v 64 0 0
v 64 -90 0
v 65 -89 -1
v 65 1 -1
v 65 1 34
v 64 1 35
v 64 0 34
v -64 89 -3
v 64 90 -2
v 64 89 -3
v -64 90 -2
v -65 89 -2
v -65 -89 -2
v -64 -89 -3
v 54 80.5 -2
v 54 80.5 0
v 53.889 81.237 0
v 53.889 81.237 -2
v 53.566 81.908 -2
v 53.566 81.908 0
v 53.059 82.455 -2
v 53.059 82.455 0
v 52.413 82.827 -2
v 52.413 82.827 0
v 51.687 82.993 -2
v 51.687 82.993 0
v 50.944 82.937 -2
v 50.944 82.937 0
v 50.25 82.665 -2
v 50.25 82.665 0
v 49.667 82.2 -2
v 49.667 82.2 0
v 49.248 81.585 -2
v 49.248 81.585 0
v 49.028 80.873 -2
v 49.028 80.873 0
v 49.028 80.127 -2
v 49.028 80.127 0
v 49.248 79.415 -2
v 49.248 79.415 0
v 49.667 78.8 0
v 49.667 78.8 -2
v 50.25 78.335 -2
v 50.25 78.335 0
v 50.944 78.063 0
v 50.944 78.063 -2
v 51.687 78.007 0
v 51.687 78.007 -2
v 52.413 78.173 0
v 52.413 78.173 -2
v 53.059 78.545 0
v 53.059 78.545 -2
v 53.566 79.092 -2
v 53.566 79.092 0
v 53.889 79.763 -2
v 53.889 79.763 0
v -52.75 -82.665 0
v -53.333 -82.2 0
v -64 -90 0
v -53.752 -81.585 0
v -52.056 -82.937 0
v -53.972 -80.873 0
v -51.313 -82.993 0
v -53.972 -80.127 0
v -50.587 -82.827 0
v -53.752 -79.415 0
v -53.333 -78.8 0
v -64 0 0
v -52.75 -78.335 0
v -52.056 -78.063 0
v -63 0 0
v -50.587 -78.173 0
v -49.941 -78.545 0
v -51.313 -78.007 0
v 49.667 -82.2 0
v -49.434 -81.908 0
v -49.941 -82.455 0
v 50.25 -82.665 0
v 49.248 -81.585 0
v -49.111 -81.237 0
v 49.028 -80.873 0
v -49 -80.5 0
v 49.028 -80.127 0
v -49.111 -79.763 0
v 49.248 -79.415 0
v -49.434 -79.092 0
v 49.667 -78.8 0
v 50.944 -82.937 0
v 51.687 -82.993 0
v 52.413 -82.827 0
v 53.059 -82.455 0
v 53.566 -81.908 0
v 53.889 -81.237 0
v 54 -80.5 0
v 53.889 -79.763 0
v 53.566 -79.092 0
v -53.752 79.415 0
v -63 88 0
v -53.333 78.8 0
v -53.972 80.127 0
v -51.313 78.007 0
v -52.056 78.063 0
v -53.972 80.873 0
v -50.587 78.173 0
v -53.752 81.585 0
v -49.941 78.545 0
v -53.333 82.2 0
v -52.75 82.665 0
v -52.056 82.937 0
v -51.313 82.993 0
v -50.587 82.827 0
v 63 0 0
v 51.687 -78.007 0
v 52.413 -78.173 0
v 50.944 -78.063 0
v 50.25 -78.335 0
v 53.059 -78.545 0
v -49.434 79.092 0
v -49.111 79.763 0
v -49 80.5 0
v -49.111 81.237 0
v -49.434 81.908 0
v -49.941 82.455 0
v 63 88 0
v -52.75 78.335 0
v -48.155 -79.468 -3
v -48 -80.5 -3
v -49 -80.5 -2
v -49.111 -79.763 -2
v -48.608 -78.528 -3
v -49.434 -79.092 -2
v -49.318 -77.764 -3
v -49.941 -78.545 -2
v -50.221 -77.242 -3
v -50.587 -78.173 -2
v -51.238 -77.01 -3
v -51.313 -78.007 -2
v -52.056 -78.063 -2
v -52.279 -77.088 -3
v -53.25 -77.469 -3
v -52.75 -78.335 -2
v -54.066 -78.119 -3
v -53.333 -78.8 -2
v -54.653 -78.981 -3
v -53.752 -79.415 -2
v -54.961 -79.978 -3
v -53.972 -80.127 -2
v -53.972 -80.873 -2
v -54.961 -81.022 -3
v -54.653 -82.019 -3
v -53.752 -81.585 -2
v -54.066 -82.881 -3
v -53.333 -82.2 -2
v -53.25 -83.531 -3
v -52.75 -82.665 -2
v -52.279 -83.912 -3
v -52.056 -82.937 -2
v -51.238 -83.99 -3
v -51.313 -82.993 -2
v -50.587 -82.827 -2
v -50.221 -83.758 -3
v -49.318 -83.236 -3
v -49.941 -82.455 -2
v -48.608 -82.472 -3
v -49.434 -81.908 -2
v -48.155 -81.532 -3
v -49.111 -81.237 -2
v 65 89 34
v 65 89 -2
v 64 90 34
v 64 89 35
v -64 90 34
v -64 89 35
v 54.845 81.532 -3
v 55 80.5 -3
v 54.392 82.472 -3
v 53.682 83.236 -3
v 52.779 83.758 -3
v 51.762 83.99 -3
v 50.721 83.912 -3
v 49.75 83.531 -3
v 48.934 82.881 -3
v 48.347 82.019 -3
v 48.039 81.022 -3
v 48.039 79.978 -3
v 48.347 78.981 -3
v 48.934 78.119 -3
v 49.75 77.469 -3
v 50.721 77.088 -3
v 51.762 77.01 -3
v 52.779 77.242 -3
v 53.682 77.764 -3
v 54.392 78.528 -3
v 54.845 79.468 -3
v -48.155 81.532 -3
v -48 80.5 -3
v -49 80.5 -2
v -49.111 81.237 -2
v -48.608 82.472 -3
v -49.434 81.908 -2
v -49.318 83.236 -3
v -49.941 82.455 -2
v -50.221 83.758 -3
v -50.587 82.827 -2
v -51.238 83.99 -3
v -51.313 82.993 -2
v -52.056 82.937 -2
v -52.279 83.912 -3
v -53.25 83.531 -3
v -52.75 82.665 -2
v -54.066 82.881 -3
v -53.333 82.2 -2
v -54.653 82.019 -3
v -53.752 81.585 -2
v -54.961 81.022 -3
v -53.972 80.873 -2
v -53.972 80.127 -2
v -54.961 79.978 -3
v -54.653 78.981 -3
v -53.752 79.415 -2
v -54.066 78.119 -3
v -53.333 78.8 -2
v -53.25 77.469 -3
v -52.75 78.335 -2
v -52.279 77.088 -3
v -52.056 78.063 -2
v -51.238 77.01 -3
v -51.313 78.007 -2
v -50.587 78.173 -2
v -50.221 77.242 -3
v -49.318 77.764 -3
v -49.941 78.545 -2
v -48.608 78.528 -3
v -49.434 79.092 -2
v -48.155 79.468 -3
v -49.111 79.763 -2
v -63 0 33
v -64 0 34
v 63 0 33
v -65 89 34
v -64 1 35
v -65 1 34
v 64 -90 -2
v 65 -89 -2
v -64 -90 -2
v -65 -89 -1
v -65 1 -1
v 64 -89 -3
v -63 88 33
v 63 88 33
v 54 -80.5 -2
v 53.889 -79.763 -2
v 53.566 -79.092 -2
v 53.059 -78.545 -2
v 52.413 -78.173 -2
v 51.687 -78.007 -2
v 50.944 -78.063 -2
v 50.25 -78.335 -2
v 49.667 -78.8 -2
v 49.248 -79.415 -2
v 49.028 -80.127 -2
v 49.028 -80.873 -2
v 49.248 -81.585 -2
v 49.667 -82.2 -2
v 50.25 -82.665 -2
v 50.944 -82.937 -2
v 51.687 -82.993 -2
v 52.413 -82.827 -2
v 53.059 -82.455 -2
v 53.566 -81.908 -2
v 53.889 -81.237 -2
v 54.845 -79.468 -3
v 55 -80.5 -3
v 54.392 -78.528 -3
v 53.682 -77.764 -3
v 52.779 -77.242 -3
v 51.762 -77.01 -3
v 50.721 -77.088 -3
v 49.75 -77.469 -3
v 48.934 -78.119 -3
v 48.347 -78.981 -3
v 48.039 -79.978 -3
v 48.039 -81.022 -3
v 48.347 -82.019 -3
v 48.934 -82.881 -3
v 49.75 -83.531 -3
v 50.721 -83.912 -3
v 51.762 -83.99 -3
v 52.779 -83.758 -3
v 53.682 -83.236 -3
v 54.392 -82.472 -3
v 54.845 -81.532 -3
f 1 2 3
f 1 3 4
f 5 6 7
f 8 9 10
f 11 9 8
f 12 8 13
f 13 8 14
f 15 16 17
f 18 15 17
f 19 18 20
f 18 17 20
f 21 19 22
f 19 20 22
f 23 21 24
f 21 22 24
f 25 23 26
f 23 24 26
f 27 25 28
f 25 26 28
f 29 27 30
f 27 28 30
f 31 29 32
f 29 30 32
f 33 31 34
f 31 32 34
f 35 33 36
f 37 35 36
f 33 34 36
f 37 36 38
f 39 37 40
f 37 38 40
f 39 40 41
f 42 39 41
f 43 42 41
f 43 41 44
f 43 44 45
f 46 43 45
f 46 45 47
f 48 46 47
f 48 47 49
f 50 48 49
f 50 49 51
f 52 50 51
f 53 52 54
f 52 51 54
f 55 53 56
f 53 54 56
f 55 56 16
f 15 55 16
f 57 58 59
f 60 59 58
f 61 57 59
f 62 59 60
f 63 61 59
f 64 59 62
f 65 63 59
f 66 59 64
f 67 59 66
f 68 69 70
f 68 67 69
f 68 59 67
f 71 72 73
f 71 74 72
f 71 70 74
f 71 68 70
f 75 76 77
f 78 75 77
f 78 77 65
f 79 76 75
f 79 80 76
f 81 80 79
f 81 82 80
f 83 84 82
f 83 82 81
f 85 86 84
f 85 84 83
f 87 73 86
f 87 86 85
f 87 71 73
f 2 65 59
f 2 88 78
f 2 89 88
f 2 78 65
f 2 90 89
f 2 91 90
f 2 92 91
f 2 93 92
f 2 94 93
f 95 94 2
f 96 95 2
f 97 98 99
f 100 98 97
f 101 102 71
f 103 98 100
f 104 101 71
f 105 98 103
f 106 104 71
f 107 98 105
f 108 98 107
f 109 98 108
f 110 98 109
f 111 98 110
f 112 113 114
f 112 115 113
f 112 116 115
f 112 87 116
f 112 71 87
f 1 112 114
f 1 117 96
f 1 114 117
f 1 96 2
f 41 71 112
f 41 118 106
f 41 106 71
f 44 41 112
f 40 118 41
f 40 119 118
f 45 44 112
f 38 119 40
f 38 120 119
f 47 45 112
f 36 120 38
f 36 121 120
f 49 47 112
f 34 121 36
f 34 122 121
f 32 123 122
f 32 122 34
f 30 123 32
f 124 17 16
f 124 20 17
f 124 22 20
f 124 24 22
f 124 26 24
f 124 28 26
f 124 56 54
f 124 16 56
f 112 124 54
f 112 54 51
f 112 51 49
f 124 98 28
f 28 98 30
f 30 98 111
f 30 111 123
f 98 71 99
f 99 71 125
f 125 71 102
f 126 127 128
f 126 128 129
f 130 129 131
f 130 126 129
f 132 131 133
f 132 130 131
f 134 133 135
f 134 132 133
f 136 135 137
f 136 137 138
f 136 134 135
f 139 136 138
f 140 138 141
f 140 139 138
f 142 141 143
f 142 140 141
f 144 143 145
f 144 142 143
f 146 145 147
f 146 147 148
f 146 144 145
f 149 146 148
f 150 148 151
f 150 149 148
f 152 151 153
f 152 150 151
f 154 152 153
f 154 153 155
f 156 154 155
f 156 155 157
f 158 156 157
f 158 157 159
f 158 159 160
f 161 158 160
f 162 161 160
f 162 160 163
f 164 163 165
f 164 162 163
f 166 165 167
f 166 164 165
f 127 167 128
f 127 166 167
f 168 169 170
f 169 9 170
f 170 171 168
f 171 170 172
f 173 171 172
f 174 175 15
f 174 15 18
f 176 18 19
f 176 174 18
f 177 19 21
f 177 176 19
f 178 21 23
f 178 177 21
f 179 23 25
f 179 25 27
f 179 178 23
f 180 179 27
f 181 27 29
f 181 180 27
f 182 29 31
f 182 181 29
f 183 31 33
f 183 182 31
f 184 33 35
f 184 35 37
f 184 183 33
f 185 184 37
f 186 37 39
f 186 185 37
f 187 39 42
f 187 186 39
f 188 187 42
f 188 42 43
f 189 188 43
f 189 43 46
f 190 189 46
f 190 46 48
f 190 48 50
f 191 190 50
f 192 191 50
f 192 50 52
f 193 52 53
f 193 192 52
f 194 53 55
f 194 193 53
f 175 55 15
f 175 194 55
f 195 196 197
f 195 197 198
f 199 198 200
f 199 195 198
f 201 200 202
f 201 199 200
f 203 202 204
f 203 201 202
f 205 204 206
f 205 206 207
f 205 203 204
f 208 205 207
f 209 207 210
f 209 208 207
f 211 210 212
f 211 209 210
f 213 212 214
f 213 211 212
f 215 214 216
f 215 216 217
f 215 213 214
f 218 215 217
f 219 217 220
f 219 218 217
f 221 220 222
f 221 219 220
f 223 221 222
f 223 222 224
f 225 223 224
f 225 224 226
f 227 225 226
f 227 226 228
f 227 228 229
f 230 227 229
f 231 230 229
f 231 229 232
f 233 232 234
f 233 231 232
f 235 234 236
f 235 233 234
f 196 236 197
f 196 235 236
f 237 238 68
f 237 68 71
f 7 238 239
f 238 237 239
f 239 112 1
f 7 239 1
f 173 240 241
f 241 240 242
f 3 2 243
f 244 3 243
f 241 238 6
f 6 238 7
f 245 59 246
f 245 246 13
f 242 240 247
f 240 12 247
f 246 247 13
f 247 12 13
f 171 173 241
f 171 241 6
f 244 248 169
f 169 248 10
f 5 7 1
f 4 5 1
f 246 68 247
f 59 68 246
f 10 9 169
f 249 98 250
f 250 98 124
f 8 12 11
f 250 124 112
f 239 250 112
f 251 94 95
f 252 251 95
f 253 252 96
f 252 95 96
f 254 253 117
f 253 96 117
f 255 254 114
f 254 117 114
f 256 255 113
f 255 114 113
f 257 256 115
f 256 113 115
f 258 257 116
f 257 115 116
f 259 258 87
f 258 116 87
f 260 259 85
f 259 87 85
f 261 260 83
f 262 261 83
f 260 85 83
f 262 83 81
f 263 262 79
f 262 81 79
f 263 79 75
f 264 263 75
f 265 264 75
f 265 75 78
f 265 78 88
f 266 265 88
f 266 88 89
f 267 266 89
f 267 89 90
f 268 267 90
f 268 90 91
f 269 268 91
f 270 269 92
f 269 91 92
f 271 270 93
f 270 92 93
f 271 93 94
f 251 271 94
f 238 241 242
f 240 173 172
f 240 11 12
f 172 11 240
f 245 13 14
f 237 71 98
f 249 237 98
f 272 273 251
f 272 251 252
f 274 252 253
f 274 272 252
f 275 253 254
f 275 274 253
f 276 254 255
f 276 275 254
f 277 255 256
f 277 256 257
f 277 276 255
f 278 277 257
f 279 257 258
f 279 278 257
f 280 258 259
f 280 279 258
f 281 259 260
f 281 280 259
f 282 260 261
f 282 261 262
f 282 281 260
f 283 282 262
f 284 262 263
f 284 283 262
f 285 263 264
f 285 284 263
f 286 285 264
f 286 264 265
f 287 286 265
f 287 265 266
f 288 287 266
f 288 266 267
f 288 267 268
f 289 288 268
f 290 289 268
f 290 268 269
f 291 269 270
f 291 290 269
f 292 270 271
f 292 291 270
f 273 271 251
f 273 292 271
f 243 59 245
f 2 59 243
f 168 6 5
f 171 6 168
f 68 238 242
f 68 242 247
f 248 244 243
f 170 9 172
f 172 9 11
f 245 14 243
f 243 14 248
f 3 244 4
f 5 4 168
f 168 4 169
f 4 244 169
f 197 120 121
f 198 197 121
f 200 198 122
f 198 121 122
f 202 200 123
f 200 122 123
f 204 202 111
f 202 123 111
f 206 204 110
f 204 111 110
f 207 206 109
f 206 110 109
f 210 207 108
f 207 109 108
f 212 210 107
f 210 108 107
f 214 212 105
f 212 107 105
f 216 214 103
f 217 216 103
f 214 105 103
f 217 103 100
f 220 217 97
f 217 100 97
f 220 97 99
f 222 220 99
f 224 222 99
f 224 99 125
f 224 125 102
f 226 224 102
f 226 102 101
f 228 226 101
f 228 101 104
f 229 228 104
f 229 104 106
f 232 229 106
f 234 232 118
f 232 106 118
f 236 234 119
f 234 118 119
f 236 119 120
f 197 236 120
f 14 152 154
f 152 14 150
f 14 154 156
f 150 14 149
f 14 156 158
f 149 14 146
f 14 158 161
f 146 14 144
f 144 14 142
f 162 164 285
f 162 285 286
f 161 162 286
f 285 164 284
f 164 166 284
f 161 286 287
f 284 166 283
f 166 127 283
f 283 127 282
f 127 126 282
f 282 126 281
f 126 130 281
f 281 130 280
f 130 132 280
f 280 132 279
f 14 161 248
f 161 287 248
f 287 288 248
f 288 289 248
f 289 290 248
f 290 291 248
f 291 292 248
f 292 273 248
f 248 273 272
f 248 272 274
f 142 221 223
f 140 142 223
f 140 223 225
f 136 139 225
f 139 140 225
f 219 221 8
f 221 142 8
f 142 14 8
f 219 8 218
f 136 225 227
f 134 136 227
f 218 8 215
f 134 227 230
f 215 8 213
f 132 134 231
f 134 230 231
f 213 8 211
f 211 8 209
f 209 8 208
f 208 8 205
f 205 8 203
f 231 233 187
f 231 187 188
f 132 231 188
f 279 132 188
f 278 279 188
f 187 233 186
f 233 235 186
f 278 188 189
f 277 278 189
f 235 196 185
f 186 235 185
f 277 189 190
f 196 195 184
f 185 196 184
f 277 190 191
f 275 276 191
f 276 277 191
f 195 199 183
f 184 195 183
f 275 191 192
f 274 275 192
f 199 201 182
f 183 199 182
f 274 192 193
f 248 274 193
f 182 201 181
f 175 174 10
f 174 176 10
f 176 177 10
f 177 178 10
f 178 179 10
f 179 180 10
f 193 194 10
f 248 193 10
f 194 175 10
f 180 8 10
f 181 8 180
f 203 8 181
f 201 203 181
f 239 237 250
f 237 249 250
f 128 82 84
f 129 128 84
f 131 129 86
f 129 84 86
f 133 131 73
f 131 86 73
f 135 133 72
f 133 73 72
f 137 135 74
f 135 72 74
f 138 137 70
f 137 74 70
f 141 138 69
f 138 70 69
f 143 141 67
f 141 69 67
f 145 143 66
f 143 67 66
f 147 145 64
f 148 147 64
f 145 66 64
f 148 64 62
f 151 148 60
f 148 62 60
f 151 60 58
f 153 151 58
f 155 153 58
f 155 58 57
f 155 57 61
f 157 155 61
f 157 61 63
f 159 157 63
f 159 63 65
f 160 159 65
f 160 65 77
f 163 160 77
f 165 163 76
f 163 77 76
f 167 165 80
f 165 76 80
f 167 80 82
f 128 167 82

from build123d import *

# Parameters (mm, degrees)
F0_W     = 126
F0_H     = 88
F0_R     = 2.5
F1_DEPTH = 3
F2_DEPTH = 35
F3_START = 33
F3_DEPTH = 2
F4_SIZE  = 1


with BuildPart() as f1:
    # F0 (on Top) → F1 (new body)
    with BuildSketch(Plane.XY):
        with Locations((0, 44)):
            Rectangle(F0_W, F0_H)
        with Locations((-51.5, 80.5)):
            Circle(F0_R, mode=Mode.SUBTRACT)
        with Locations((51.5, 80.5)):
            Circle(F0_R, mode=Mode.SUBTRACT)
        Polygon((65, -90), (65, 0), (63, 0), (63, -88), (-63, -88), (-63, 0), (-65, 0), (-65, -90), align=None)
        Polygon((65, 0), (65, 90), (-65, 90), (-65, 0), (-63, 0), (-63, 88), (63, 88), (63, 0), align=None)
        with Locations((0, -44)):
            Rectangle(F0_W, F0_H)
        with Locations((-51.5, -80.5)):
            Circle(F0_R, mode=Mode.SUBTRACT)
        with Locations((51.5, -80.5)):
            Circle(F0_R, mode=Mode.SUBTRACT)
    extrude(amount=-F1_DEPTH)

    # F0 (on Top) → F2 (join)
    with BuildSketch(Plane.XY):
        Polygon((65, 0), (65, 90), (-65, 90), (-65, 0), (-63, 0), (-63, 88), (63, 88), (63, 0), align=None)
    extrude(amount=F2_DEPTH)

    # F0 (on Top) → F3 (join)
    with BuildSketch(Plane.XY.offset(F3_START)):
        with Locations((0, 44)):
            Rectangle(F0_W, F0_H)
        with Locations((-51.5, 80.5)):
            Circle(F0_R, mode=Mode.SUBTRACT)
        with Locations((51.5, 80.5)):
            Circle(F0_R, mode=Mode.SUBTRACT)
        Polygon((65, 0), (65, 90), (-65, 90), (-65, 0), (-63, 0), (-63, 88), (63, 88), (63, 0), align=None)
        with Locations((-51.5, 80.5)):
            Circle(F0_R)
        with Locations((51.5, 80.5)):
            Circle(F0_R)
    extrude(amount=F3_DEPTH)

    # F4
    f4_edges = [f1.edges().sort_by_distance(p)[0] for p in [
        (65, 45, 35),
        (0, 90, 35),
        (-65, 45, 35),
        (0, 0, 35),
        (-65, 0, -3),
        (-65, -90, -1.5),
        (-65, -45, 0),
        (-65, 0, 17.5),
        (-65, 90, 16),
        (65, 90, 16),
        (0, 90, -3),
        (65, -45, 0),
        (65, -90, -1.5),
        (65, 0, -3),
        (65, 0, 17.5),
        (-54, 80.5, -3),
        (49, 80.5, -3),
        (0, -90, -3),
        (-54, -80.5, -3),
        (49, -80.5, -3),
    ]]
    chamfer(f4_edges, length=F4_SIZE)


solid = f1.part
